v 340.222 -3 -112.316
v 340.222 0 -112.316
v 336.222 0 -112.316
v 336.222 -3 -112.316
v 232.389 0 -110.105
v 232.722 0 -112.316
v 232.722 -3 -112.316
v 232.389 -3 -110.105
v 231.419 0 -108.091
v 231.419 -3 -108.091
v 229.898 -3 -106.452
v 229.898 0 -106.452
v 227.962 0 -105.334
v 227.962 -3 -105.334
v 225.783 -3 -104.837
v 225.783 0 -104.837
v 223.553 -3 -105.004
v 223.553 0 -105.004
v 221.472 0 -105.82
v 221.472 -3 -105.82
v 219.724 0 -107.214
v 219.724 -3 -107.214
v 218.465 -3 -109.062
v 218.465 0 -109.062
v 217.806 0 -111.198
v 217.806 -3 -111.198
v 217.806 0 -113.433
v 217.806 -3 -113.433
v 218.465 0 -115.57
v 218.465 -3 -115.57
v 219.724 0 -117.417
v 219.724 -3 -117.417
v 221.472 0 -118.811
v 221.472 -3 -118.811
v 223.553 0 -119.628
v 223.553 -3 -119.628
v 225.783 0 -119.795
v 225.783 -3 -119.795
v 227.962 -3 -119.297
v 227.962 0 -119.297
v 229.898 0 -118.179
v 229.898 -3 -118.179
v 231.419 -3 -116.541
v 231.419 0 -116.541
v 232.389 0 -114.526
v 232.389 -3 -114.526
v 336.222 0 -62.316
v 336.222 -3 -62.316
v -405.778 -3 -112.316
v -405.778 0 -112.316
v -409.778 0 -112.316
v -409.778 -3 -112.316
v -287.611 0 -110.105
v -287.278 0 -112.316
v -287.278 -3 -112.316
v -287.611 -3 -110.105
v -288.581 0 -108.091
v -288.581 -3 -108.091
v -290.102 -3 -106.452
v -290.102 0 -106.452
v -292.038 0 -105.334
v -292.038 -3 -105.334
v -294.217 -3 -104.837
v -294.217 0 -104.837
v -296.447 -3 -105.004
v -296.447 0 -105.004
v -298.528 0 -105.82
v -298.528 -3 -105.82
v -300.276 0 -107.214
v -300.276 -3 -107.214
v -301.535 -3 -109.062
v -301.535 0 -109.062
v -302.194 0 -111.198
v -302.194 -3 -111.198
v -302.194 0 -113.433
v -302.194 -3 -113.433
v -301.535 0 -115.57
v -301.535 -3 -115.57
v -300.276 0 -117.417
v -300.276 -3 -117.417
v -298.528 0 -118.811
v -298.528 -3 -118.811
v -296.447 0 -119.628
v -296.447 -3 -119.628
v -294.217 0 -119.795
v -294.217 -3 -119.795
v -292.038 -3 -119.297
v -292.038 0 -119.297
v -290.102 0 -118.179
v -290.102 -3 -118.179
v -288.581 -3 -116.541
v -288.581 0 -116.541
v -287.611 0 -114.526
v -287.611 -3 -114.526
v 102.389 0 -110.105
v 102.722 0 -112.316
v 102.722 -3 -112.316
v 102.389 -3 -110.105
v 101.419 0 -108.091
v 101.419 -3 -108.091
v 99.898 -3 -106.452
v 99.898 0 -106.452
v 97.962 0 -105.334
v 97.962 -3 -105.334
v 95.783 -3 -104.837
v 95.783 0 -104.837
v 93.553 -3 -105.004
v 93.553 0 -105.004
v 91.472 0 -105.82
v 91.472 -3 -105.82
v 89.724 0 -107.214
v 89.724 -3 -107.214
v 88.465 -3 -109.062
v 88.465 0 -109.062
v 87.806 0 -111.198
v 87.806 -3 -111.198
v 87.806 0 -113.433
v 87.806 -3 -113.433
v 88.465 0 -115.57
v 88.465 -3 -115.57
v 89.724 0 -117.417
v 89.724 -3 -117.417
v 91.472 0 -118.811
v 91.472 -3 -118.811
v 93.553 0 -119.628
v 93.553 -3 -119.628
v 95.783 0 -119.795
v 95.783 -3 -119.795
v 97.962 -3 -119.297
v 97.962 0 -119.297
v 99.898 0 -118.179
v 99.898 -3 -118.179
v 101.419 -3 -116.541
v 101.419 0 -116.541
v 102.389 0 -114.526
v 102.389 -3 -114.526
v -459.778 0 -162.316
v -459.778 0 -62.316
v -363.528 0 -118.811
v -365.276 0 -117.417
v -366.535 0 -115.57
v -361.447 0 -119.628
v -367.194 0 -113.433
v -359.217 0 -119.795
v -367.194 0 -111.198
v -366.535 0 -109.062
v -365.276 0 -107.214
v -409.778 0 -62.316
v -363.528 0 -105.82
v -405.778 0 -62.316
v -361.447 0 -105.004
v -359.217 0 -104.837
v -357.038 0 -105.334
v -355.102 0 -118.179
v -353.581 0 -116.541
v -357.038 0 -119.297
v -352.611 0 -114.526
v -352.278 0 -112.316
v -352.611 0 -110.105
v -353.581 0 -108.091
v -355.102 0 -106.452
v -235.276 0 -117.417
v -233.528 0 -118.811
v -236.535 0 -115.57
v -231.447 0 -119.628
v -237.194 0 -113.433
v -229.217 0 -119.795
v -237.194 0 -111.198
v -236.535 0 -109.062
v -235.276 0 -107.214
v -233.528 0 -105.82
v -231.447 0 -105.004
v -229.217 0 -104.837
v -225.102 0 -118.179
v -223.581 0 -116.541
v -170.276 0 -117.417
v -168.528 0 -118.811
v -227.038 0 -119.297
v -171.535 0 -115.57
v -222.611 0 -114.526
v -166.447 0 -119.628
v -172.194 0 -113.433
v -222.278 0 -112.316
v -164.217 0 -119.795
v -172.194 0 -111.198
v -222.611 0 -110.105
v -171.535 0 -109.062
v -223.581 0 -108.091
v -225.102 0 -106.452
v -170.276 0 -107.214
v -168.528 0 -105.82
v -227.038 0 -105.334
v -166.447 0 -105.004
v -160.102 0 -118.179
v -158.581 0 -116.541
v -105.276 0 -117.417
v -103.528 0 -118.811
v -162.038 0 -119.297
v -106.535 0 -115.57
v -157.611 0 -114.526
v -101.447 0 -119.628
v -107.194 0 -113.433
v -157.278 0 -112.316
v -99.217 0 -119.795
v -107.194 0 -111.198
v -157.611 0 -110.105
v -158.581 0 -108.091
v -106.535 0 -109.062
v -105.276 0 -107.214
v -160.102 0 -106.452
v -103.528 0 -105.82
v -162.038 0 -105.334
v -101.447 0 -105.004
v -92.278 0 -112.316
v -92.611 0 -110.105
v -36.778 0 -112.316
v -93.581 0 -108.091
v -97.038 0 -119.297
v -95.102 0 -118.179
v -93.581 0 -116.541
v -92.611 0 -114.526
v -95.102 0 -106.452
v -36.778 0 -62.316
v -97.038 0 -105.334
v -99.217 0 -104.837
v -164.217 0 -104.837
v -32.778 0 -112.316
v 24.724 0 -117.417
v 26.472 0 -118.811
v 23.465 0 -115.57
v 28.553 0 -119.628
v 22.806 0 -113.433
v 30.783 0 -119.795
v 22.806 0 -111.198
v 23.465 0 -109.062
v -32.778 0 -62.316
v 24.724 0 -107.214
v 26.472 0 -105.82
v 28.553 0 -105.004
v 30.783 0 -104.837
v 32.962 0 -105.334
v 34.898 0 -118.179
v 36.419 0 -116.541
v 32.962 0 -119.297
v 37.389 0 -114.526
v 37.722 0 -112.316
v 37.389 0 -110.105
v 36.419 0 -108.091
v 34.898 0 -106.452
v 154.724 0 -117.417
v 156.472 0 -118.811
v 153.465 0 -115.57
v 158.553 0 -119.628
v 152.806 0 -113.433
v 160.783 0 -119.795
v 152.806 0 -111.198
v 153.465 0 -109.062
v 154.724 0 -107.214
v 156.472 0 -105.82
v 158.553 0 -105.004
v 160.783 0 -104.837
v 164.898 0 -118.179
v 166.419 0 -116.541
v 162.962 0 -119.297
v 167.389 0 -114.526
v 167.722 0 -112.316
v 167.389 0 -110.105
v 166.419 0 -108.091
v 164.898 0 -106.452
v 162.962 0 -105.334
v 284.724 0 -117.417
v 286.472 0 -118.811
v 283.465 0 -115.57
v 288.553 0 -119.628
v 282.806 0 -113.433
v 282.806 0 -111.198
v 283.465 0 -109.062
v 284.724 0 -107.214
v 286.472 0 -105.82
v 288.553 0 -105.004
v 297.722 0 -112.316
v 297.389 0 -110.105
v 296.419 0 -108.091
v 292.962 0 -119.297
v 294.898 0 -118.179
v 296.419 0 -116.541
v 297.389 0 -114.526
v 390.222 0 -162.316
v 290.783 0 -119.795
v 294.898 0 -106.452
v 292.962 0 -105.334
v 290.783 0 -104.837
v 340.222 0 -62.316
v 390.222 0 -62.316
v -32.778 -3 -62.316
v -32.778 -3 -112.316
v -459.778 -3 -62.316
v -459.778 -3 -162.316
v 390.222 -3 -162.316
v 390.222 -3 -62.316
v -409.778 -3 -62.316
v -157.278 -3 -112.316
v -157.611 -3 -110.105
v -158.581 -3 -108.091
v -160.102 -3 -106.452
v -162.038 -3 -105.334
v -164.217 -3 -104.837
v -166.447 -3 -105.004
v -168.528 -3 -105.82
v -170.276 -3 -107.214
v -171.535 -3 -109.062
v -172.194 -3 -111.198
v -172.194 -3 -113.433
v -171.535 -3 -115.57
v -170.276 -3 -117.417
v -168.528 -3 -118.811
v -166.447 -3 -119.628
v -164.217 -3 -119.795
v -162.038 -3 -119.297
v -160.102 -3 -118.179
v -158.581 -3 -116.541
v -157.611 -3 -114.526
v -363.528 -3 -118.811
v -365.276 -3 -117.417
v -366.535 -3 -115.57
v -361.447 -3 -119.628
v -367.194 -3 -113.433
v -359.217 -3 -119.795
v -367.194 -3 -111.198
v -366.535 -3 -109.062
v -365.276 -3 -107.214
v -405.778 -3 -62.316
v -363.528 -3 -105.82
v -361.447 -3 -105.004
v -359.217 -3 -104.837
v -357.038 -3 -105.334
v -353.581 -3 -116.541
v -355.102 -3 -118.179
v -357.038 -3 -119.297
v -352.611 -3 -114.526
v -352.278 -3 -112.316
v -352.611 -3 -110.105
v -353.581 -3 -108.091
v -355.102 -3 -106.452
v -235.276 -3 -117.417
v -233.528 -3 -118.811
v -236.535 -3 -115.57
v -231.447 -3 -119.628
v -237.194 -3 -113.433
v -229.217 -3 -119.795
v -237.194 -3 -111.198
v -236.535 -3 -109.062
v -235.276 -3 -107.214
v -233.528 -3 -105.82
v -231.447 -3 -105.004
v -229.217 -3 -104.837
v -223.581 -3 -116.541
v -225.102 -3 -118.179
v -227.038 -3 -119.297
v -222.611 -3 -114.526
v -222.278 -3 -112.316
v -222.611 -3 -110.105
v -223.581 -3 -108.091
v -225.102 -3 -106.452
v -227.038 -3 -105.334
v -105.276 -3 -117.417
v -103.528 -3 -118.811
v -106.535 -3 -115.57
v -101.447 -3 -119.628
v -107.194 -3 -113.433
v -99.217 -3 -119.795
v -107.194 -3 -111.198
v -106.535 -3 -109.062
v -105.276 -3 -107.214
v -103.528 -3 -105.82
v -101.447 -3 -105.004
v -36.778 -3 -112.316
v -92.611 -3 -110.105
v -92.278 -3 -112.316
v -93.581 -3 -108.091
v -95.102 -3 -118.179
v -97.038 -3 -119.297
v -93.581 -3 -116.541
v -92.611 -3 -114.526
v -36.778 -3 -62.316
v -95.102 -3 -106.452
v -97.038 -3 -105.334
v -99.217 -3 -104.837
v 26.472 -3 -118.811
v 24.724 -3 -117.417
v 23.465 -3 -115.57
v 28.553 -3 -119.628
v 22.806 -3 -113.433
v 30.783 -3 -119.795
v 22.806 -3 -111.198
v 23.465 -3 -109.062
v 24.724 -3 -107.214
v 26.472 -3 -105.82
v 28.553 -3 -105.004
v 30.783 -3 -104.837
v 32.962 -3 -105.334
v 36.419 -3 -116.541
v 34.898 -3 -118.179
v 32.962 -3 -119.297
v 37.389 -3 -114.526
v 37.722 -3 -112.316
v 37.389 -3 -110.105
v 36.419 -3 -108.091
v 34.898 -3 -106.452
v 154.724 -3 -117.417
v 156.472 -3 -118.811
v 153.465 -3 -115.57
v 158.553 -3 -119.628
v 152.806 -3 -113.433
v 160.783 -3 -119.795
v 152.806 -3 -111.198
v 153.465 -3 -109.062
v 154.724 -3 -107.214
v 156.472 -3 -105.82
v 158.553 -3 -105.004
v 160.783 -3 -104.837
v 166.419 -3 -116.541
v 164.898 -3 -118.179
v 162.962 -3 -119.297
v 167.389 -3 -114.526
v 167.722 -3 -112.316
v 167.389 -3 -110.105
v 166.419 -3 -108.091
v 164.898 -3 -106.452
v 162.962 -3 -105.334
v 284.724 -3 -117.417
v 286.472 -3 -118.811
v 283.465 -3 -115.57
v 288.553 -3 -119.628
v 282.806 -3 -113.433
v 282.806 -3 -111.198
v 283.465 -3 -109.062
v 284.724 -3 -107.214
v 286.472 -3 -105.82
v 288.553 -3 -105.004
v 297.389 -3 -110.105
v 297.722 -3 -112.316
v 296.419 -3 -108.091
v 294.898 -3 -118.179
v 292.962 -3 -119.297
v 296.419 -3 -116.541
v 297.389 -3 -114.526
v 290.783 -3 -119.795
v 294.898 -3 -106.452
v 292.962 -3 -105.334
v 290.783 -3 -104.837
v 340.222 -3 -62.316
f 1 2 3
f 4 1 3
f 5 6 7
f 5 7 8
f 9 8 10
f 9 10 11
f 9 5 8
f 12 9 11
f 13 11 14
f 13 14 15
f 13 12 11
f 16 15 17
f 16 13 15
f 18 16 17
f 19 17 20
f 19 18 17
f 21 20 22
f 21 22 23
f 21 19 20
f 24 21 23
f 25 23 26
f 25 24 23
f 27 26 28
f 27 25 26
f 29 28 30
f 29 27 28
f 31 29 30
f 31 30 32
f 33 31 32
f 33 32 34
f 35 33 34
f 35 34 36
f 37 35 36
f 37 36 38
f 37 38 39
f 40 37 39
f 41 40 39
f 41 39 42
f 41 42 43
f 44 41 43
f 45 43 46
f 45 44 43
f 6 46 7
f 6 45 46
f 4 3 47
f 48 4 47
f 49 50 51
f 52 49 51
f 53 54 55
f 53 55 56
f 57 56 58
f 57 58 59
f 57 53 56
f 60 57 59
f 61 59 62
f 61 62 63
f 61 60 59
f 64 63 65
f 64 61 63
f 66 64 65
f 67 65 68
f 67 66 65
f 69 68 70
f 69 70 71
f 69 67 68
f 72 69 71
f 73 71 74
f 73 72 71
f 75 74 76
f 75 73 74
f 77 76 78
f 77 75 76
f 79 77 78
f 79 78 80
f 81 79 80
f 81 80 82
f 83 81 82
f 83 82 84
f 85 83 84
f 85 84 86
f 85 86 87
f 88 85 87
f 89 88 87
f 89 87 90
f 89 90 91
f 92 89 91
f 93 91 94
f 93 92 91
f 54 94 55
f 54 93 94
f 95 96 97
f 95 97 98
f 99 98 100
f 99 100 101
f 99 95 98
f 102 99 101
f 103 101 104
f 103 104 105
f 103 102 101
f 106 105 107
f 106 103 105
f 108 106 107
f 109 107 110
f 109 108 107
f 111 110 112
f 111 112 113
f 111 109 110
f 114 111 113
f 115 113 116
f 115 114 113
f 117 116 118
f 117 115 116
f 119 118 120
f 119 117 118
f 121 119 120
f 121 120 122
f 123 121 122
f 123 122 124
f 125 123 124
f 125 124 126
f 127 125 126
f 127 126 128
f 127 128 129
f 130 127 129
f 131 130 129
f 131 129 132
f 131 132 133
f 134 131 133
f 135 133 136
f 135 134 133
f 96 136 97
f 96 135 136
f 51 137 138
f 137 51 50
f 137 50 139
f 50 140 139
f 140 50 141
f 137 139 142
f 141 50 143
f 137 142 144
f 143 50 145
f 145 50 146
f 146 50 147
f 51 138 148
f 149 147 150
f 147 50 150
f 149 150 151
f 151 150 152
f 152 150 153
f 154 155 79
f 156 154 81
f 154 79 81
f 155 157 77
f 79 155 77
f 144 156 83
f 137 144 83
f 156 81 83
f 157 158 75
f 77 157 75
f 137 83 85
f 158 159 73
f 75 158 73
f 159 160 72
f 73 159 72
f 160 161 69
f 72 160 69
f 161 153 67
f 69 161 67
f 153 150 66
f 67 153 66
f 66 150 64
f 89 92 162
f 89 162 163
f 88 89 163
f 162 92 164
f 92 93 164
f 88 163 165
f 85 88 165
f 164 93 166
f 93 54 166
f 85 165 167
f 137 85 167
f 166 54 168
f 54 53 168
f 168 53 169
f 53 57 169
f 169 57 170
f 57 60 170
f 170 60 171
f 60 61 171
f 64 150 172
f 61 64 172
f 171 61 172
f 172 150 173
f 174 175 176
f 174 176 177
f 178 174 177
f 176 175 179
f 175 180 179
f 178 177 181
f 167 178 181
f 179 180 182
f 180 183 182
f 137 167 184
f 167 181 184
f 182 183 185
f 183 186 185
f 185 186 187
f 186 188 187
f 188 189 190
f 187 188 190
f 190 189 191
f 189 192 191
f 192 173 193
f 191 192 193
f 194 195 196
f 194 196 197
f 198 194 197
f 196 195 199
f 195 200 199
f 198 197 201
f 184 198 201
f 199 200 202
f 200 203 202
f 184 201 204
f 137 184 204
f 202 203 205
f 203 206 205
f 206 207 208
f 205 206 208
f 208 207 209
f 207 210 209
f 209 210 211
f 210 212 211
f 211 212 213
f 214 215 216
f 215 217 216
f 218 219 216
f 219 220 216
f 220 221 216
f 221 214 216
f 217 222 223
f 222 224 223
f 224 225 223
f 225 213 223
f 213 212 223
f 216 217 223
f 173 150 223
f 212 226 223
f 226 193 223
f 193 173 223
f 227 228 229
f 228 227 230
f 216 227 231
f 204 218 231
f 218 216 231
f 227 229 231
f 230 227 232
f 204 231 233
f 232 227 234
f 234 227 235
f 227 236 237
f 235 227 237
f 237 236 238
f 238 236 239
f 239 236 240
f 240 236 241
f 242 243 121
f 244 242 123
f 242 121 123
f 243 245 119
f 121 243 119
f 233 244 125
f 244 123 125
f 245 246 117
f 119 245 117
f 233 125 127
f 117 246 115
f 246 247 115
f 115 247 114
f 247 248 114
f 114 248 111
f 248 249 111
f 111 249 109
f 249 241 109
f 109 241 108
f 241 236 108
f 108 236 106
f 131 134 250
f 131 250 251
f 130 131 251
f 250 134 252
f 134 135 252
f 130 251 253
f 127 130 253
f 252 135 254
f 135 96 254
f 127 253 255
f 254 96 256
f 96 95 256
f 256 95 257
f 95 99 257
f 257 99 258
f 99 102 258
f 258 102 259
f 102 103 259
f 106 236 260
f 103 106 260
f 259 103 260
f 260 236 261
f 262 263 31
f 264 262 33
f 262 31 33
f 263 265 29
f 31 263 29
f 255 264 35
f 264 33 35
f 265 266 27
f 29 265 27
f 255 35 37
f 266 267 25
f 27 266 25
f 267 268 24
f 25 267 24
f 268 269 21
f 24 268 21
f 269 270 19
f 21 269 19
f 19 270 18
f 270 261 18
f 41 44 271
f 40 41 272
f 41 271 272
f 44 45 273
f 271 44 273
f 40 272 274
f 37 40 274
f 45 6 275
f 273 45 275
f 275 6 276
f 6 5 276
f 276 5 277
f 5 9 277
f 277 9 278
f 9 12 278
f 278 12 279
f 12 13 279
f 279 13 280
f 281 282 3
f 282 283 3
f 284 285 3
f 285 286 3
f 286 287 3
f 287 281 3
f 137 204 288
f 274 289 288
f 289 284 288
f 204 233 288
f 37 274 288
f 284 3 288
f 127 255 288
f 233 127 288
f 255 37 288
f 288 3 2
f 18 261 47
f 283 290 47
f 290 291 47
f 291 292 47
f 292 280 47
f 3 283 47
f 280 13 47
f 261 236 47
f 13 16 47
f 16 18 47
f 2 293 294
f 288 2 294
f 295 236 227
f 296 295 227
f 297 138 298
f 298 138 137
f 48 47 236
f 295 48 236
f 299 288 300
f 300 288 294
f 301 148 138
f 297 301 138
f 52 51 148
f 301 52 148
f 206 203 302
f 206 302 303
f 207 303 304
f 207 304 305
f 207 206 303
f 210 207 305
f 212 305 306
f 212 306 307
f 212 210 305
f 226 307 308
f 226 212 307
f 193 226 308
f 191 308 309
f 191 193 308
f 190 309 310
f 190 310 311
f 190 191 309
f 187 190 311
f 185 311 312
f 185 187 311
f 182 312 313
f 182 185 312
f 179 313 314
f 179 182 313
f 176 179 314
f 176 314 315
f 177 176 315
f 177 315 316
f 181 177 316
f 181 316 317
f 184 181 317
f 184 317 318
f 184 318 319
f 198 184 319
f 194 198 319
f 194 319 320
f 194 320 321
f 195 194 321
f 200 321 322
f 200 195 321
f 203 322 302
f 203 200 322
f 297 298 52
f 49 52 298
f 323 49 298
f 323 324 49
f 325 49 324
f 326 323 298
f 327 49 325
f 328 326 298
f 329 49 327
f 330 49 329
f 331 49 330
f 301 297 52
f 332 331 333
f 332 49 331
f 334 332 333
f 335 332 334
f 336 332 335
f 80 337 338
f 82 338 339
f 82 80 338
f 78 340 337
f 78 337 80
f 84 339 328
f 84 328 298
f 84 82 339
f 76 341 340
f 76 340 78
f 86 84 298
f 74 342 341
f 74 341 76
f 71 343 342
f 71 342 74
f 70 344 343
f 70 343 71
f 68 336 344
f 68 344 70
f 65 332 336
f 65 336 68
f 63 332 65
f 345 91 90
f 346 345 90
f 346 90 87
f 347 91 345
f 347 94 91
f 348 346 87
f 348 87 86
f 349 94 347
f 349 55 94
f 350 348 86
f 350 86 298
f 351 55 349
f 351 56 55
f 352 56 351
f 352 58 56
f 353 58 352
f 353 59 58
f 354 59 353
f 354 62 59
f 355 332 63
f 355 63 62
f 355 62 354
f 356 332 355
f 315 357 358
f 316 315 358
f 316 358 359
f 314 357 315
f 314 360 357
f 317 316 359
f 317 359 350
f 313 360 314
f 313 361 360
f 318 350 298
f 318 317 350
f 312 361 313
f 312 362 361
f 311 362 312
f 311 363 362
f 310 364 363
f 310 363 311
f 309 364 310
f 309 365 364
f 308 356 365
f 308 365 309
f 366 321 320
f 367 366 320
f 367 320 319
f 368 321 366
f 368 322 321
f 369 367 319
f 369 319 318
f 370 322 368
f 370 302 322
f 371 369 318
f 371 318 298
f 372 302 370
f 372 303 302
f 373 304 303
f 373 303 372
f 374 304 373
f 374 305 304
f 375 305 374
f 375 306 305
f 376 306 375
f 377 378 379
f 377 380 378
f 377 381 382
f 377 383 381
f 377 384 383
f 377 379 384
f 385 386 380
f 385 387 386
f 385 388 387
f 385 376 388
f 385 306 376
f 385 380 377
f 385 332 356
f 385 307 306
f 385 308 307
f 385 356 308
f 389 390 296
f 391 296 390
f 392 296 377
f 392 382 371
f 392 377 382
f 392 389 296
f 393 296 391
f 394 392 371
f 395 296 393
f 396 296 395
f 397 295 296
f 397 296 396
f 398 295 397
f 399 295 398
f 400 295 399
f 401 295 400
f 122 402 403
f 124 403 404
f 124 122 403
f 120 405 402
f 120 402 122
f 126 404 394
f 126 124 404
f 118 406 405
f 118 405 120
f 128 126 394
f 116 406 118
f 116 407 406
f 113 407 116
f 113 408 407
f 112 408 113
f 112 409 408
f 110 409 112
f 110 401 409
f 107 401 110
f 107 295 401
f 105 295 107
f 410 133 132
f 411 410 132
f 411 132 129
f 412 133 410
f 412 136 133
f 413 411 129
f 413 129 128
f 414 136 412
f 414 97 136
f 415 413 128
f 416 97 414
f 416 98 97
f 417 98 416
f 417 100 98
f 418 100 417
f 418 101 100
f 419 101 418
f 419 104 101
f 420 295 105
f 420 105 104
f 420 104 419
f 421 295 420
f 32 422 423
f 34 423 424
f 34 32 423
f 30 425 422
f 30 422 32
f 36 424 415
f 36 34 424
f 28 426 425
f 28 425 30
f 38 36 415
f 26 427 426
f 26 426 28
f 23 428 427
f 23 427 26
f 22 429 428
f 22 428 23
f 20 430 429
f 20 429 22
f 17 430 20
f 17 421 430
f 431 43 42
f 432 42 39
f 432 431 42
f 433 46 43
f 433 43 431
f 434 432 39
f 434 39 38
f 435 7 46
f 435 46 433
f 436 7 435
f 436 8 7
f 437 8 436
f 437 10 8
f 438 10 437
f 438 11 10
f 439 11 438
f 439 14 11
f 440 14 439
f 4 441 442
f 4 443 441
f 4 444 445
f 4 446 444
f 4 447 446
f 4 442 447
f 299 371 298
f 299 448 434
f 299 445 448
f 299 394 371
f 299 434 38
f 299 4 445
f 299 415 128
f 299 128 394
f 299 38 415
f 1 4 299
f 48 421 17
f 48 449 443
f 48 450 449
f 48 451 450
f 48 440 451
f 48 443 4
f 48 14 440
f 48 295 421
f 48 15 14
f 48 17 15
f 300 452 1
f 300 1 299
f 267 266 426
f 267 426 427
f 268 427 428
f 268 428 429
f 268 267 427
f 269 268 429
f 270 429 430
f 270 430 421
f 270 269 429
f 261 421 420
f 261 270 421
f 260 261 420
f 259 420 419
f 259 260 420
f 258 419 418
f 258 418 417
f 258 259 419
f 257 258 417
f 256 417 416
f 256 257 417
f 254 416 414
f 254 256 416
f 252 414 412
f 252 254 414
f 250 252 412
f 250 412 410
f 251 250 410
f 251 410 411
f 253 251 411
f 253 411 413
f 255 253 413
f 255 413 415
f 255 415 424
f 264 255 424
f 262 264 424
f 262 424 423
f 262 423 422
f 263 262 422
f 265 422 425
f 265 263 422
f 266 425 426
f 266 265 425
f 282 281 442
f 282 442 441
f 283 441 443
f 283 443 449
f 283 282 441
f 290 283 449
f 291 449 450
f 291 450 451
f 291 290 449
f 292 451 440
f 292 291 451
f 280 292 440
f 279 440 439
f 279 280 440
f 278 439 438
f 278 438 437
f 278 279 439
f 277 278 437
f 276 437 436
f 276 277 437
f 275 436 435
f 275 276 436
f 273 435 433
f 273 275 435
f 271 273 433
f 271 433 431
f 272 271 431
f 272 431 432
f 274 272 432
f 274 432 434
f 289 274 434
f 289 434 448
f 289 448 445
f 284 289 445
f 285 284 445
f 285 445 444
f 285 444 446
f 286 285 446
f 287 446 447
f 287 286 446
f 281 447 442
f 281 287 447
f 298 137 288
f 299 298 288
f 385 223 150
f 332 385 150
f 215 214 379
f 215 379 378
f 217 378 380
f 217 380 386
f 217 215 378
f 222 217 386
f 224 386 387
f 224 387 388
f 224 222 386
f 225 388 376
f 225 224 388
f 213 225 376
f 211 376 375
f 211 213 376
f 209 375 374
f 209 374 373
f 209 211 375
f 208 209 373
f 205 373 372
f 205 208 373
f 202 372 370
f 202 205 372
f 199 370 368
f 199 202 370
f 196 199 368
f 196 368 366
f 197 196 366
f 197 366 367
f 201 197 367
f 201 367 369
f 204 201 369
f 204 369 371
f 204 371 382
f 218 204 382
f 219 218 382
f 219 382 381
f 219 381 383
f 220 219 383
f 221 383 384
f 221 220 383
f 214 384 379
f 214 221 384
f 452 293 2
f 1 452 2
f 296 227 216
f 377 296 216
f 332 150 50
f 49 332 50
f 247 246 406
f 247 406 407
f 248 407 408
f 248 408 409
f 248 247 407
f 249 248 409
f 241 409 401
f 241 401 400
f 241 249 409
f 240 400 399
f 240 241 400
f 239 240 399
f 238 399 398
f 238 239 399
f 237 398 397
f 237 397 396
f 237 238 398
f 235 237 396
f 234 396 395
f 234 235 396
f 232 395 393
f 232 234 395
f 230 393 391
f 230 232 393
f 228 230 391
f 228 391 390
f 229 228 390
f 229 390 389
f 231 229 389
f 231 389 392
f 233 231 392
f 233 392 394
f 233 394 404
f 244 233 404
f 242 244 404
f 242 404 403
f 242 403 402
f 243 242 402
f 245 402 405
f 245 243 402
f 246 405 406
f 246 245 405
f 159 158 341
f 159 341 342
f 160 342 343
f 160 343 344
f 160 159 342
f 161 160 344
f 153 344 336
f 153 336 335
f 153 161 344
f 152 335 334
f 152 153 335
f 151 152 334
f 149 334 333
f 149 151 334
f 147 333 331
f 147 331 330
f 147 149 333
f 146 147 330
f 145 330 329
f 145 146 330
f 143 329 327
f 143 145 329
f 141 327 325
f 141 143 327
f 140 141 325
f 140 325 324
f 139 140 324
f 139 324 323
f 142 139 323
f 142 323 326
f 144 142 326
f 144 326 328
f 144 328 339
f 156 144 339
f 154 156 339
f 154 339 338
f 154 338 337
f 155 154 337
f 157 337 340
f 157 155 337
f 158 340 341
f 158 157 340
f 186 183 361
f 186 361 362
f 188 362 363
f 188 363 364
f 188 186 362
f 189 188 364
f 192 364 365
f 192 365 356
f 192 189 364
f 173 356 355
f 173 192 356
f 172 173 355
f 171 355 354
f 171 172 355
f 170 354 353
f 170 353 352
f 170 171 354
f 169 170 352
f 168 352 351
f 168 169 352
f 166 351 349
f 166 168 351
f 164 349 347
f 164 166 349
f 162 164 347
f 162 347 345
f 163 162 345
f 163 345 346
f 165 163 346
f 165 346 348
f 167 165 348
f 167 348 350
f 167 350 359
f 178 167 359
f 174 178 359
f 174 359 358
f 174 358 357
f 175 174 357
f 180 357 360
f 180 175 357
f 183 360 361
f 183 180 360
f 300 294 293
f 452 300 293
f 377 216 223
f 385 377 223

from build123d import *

# Parameters (mm, degrees)
F0_R     = 7.5
F1_DEPTH = 3


with BuildPart() as f1:
    # F0 (on Front) → F1 (new body)
    with BuildSketch(Plane.XZ):
        Polygon((-409.777922, -62.315632), (-459.777922, -62.315632), (-459.777922, -162.315632), (390.222078, -162.315632), (390.222078, -62.315632), (340.222078, -62.315632), (340.222078, -112.315632), (336.222078, -112.315632), (336.222078, -62.315632), (-32.777922, -62.315632), (-32.777922, -112.315632), (-36.777922, -112.315632), (-36.777922, -62.315632), (-405.777922, -62.315632), (-405.777922, -112.315632), (-409.777922, -112.315632), align=None)
        with Locations((-359.777922, -112.315632)):
            Circle(F0_R, mode=Mode.SUBTRACT)
        with Locations((-294.777922, -112.315632)):
            Circle(F0_R, mode=Mode.SUBTRACT)
        with Locations((-229.777922, -112.315632)):
            Circle(F0_R, mode=Mode.SUBTRACT)
        with Locations((-164.777922, -112.315632)):
            Circle(F0_R, mode=Mode.SUBTRACT)
        with Locations((-99.777922, -112.315632)):
            Circle(F0_R, mode=Mode.SUBTRACT)
        with Locations((30.222078, -112.315632)):
            Circle(F0_R, mode=Mode.SUBTRACT)
        with Locations((95.222078, -112.315632)):
            Circle(F0_R, mode=Mode.SUBTRACT)
        with Locations((160.222078, -112.315632)):
            Circle(F0_R, mode=Mode.SUBTRACT)
        with Locations((225.222078, -112.315632)):
            Circle(F0_R, mode=Mode.SUBTRACT)
        with Locations((290.222078, -112.315632)):
            Circle(F0_R, mode=Mode.SUBTRACT)
    extrude(amount=F1_DEPTH)


solid = f1.part
